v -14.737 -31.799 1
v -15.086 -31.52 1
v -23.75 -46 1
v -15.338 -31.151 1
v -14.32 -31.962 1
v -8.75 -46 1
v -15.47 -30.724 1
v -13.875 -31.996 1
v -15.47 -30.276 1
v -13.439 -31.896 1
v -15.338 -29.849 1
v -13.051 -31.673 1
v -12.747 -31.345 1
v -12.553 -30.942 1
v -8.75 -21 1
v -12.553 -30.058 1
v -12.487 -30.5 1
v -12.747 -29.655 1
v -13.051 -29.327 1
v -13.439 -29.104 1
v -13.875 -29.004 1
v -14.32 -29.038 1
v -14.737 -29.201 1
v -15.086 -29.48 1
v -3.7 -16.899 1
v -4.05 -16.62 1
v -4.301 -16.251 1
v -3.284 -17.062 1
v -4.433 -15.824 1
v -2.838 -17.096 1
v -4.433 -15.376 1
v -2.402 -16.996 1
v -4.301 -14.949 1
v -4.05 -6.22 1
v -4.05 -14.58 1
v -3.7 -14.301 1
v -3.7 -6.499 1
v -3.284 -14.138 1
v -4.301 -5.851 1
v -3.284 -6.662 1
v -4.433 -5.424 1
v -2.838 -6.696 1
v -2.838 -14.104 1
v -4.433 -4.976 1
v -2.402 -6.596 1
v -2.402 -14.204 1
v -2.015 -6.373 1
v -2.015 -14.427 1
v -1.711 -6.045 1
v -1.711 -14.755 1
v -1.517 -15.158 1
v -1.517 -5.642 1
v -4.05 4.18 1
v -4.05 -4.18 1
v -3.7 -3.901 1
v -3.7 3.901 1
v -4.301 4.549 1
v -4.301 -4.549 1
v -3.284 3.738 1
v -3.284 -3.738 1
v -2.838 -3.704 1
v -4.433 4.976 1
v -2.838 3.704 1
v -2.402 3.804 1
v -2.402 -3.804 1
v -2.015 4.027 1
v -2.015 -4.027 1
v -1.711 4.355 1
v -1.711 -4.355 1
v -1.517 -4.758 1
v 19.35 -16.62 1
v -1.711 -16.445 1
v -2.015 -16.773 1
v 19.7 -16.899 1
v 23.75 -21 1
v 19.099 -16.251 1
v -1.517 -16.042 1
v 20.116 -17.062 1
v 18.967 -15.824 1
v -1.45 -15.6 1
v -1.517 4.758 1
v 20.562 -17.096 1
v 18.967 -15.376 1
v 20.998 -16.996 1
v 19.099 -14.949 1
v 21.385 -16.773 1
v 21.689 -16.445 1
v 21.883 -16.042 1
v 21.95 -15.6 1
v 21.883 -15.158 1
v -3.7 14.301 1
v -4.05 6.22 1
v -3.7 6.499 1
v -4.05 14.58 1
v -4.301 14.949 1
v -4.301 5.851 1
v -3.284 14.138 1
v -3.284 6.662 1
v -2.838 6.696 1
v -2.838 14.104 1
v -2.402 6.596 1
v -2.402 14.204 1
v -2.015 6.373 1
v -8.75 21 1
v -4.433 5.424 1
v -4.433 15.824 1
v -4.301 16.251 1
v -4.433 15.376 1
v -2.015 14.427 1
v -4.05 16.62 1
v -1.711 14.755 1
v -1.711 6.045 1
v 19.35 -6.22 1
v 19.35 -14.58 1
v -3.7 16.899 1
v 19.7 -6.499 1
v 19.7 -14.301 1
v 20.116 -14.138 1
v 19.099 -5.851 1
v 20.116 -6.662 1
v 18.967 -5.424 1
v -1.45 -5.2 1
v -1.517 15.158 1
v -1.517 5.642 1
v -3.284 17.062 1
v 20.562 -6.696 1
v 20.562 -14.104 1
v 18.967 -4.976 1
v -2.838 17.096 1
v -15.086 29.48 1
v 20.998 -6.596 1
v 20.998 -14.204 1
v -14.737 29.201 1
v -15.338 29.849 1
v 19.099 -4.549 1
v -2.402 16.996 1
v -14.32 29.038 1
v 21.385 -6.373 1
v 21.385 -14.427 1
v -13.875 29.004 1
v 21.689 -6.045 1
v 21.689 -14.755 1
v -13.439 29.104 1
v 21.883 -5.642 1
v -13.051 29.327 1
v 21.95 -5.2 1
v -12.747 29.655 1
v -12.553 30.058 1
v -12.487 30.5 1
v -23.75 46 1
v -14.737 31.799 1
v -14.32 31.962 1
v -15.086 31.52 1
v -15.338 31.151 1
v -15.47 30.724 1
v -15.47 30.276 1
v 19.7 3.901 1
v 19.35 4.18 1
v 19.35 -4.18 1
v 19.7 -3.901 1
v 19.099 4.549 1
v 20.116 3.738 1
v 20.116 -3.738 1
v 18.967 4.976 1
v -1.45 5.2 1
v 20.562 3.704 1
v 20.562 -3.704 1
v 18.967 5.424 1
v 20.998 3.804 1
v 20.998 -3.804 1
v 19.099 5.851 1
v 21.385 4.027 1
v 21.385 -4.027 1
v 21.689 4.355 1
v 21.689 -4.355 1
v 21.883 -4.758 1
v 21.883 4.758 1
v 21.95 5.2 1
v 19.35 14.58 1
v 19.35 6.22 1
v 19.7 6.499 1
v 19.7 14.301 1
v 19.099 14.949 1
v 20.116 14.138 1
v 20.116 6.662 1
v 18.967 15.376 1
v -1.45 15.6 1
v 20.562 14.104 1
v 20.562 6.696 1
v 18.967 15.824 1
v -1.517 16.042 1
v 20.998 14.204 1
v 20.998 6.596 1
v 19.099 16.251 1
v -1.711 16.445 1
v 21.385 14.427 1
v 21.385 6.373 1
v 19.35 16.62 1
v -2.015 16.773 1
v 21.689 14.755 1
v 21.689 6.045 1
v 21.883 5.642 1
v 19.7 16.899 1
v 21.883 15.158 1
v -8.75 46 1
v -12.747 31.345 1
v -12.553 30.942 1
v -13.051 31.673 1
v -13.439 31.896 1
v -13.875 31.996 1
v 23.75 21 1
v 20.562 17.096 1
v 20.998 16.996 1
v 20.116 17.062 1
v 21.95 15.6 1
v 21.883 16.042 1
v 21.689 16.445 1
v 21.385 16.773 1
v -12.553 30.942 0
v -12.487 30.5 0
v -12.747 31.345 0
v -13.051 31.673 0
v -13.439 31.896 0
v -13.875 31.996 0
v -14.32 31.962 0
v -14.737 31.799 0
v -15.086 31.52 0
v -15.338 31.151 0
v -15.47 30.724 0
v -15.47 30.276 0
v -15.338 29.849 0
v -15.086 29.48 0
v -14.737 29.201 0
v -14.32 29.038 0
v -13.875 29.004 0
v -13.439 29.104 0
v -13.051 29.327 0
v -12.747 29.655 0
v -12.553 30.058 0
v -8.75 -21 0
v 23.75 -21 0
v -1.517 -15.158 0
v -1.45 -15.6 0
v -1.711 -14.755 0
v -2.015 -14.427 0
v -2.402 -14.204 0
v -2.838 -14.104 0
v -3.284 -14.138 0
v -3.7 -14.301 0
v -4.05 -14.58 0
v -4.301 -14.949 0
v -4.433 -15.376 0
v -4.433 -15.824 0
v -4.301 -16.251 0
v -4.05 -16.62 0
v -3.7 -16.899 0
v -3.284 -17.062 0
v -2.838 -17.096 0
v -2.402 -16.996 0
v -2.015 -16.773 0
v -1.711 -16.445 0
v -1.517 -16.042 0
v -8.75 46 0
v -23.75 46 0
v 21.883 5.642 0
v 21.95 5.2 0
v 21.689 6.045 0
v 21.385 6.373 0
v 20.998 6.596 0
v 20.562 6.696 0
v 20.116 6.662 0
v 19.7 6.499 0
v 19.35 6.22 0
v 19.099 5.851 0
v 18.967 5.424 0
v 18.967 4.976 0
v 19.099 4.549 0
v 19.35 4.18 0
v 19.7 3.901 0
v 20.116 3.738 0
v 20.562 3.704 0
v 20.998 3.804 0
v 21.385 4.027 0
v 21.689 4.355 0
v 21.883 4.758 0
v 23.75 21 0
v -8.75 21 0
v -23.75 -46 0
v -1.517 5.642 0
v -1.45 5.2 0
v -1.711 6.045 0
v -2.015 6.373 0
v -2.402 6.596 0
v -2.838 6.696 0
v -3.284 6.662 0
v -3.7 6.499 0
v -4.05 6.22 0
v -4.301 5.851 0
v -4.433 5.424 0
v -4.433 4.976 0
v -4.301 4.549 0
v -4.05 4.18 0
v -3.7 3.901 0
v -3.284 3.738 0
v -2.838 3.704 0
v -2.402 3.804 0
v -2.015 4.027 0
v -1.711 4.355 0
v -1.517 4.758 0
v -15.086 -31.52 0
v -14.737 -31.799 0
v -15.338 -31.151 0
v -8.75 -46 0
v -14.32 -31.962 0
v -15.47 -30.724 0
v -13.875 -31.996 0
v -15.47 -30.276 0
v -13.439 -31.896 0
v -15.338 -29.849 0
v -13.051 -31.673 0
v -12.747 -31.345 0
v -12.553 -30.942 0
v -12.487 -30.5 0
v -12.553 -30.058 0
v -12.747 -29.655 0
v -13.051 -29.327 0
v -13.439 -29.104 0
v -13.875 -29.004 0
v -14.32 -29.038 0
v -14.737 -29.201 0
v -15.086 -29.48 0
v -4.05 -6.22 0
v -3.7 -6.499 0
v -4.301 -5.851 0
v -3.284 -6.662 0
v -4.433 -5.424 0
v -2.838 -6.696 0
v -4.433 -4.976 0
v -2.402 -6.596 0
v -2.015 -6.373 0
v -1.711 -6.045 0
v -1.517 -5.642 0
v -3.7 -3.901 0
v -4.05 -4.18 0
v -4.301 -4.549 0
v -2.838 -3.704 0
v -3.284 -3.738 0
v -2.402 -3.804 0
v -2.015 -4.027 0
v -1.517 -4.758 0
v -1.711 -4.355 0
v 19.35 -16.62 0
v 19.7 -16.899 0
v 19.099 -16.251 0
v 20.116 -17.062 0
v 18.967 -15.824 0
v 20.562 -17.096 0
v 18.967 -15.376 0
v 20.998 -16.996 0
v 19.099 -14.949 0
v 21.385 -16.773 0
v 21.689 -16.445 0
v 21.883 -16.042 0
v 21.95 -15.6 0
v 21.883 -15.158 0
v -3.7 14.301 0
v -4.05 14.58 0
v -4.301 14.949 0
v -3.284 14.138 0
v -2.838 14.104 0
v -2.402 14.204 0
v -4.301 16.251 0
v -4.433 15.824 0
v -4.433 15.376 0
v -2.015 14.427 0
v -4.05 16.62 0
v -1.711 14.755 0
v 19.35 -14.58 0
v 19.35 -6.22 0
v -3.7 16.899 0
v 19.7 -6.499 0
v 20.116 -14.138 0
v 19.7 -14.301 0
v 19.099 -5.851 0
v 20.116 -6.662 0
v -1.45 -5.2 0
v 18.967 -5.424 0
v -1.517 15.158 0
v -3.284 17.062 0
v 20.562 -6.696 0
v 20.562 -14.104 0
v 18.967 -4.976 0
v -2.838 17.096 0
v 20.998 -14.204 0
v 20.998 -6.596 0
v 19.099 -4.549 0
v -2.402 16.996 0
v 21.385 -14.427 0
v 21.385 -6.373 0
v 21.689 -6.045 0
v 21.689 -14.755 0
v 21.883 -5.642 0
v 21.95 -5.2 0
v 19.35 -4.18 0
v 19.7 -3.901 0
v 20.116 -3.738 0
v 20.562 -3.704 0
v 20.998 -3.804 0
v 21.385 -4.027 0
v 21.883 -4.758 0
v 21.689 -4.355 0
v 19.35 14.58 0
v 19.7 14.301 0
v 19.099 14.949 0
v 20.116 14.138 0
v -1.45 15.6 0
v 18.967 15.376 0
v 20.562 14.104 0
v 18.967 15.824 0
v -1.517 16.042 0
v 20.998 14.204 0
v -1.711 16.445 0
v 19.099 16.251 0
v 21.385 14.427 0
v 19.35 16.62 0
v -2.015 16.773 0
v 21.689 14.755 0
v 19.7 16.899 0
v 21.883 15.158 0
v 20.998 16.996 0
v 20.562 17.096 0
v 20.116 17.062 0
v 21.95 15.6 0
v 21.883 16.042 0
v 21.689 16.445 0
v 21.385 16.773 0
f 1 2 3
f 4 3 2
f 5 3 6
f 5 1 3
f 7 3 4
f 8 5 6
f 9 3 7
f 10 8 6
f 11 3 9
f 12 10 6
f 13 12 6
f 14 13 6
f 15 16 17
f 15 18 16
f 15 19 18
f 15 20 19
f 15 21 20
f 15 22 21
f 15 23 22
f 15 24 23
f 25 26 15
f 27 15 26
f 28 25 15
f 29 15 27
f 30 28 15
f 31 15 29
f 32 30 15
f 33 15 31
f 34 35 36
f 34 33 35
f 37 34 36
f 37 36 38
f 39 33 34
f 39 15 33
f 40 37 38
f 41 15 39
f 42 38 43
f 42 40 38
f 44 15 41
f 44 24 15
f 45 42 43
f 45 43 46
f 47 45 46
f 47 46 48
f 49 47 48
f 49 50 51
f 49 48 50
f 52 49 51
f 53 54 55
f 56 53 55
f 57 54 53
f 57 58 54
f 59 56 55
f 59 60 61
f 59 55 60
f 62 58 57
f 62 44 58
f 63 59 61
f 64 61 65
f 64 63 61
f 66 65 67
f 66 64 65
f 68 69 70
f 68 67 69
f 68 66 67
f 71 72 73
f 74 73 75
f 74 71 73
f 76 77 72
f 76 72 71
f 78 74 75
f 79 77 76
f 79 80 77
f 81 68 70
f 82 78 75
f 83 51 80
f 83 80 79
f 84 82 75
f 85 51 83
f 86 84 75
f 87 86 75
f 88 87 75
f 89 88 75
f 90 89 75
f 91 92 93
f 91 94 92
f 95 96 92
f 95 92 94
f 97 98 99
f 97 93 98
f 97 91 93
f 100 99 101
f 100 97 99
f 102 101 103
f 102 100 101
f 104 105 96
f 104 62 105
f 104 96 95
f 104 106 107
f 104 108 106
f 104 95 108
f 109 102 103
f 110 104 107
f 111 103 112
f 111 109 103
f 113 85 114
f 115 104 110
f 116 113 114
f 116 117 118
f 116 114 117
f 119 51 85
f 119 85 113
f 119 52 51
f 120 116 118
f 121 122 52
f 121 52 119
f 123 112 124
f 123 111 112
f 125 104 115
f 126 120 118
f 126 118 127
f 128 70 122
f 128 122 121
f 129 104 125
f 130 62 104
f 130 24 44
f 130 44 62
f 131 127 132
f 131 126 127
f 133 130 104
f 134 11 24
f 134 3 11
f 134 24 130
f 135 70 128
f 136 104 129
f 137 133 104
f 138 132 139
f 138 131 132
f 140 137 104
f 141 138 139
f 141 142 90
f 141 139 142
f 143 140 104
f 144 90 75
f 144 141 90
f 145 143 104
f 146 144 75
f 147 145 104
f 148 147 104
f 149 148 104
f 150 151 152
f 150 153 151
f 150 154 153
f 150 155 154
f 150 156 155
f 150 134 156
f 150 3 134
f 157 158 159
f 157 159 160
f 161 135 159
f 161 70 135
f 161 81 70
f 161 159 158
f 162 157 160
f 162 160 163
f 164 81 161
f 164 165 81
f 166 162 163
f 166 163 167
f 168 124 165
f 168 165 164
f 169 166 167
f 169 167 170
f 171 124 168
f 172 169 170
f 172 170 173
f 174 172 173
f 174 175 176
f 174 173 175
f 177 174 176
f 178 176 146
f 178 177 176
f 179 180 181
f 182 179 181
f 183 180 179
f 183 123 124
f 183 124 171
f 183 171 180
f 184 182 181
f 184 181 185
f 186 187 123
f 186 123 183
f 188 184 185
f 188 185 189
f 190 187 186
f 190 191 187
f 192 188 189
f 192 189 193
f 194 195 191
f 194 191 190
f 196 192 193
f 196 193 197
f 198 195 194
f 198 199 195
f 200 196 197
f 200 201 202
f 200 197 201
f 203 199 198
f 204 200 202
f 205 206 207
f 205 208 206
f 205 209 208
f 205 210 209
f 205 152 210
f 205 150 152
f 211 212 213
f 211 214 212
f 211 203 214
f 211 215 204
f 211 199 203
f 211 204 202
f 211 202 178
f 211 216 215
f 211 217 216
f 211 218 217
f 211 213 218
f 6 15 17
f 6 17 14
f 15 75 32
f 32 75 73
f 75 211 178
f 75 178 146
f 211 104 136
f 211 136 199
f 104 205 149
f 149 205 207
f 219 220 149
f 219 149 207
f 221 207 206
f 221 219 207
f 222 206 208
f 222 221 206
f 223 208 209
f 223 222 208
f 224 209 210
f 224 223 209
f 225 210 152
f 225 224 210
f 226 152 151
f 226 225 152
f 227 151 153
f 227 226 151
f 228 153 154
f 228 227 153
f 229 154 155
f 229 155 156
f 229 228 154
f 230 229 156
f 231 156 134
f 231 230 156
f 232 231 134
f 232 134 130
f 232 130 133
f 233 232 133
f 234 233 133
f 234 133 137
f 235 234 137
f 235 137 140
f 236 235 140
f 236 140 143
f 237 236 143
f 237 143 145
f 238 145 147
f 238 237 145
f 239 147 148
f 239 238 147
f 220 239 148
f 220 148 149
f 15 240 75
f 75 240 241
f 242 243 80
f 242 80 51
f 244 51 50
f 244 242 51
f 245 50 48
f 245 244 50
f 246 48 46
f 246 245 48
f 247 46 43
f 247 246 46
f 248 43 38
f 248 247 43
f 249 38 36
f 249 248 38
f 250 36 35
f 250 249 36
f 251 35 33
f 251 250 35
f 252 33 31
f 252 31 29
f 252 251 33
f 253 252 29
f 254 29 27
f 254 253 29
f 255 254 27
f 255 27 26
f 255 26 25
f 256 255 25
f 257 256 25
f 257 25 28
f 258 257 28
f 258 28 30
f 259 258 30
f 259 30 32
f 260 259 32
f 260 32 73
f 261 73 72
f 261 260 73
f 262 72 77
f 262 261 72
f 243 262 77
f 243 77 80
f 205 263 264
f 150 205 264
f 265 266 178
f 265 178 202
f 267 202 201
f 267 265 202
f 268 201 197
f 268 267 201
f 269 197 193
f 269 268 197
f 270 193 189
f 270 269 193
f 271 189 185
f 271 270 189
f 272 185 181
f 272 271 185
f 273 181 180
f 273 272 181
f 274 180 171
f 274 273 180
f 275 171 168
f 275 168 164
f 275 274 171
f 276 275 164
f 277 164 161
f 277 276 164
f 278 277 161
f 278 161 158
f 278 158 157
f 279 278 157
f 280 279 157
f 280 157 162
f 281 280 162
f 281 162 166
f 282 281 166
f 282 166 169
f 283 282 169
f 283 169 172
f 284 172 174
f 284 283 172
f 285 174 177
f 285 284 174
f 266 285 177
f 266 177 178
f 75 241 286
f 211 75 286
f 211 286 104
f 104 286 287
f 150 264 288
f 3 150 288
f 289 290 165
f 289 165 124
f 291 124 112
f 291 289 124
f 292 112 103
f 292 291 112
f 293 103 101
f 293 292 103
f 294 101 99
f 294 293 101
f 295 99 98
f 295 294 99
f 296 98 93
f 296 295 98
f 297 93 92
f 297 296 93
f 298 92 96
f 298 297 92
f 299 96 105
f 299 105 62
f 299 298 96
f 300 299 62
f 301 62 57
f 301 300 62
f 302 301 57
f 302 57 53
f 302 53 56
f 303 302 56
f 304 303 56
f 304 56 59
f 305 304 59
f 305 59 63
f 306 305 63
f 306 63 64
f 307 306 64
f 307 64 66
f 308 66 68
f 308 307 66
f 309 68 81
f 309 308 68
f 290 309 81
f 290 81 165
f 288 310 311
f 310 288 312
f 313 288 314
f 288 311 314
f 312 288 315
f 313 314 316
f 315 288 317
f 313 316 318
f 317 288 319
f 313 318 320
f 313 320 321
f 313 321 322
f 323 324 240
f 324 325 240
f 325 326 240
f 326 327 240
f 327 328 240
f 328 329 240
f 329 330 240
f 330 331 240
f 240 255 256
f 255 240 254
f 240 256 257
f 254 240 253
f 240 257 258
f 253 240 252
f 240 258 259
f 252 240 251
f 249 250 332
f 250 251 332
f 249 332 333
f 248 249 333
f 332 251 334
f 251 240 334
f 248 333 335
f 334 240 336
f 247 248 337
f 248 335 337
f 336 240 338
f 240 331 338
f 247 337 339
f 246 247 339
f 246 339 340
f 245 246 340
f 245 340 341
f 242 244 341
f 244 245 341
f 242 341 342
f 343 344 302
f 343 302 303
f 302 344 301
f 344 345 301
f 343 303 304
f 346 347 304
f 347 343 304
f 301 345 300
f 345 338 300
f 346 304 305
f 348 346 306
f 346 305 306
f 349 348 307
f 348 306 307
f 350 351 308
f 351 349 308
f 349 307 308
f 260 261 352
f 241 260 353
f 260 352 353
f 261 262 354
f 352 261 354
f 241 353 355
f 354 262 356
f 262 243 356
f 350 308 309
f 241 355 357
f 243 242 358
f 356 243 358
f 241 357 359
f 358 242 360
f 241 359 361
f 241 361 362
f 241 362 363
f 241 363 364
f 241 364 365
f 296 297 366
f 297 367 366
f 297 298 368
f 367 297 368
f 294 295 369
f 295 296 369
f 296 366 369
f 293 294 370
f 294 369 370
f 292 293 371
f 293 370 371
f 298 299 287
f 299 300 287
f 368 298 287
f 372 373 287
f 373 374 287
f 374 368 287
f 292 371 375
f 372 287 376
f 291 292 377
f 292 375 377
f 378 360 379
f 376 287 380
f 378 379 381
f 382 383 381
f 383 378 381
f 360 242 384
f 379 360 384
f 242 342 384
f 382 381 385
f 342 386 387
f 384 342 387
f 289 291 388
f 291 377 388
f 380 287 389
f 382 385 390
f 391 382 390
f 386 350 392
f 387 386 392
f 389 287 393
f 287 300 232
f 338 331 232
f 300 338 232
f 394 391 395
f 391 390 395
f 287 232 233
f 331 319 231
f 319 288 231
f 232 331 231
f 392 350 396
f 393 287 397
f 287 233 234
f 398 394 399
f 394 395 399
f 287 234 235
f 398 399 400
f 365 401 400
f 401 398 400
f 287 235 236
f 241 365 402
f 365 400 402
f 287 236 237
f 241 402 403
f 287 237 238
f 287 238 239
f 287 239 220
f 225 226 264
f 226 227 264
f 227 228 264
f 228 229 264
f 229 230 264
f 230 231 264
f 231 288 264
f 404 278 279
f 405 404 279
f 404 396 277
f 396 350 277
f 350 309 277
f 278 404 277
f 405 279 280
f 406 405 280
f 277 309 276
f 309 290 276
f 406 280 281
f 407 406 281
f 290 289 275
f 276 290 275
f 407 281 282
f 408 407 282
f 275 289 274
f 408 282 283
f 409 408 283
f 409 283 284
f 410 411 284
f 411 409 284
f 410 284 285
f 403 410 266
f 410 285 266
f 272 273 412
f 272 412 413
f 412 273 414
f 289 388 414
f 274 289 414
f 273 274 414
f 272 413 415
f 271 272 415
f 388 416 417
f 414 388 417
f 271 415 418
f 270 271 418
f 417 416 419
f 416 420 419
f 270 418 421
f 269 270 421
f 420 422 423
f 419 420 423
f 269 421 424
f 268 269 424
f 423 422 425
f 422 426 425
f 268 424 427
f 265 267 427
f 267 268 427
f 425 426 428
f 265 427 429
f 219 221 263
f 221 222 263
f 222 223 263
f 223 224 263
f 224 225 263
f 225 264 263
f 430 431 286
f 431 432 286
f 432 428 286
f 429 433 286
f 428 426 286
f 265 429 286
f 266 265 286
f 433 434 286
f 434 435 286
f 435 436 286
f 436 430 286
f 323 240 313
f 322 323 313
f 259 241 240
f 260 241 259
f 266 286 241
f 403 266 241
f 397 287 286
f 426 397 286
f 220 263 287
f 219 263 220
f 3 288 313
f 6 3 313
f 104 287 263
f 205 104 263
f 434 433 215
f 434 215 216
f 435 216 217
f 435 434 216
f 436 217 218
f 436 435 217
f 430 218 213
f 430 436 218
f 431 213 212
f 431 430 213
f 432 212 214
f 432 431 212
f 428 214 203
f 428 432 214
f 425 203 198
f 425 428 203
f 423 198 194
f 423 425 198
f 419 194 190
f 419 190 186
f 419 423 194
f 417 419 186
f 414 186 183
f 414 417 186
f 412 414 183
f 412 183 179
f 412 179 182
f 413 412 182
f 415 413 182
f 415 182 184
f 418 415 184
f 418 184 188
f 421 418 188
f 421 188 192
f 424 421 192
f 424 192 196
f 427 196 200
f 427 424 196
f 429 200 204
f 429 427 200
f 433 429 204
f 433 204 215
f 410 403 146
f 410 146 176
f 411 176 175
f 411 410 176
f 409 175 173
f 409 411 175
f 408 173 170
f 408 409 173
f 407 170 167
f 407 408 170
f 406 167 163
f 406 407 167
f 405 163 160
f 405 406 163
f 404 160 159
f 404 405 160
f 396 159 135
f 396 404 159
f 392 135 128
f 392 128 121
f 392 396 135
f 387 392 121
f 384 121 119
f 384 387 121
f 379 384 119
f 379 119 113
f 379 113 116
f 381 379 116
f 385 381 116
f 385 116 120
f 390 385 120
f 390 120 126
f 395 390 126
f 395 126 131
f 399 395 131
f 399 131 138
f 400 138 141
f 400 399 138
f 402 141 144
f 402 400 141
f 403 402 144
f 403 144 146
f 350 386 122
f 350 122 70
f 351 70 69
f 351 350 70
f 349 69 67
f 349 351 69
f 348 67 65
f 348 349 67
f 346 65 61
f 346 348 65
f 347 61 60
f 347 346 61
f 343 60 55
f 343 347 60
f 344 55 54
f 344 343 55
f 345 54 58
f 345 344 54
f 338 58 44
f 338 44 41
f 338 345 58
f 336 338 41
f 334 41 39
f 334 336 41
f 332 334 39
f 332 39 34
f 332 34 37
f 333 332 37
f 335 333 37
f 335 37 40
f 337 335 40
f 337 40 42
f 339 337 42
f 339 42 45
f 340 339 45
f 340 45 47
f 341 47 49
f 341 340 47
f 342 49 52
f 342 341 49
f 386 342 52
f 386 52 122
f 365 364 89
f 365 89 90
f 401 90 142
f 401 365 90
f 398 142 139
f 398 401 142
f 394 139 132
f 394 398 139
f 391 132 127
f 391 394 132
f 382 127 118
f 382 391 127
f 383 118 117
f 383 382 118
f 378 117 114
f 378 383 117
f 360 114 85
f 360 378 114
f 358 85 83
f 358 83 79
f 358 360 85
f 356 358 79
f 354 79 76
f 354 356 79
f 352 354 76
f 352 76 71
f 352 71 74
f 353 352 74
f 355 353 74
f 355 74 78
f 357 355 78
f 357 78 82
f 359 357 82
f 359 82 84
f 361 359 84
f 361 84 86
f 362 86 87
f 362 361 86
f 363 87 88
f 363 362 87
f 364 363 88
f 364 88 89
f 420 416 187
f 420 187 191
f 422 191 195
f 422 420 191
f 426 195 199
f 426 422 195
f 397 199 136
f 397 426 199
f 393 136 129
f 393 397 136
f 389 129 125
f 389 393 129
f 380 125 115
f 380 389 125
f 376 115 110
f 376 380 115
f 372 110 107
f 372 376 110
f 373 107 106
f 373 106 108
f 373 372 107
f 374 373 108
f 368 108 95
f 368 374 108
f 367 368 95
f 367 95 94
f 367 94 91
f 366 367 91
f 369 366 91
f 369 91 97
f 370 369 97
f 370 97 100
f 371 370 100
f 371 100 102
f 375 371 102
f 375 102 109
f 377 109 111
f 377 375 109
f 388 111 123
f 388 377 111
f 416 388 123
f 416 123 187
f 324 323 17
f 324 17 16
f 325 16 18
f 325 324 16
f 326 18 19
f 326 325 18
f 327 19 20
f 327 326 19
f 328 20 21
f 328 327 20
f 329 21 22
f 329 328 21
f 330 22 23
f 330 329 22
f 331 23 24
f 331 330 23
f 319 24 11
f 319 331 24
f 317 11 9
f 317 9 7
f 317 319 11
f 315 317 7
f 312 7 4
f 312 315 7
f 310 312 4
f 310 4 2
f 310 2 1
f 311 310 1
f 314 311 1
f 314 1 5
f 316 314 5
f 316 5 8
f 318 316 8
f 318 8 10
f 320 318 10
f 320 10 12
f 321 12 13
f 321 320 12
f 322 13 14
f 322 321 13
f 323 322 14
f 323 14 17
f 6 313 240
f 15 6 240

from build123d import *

# Parameters (mm, degrees)
SKETCH_1_R      = 1.5
EXTRUDE_1_DEPTH = 1


with BuildPart() as part:
    # Эскиз1 → Бобышка-Вытянуть1 (new body)
    with BuildSketch(Plane.XY):
        Polygon((-23.75, 46), (-23.75, -46), (-8.75, -46), (-8.75, -21), (23.75, -21), (23.75, 21), (-8.75, 21), (-8.75, 46), align=None)
        with Locations((-13.986702311, 30.5)):
            Circle(SKETCH_1_R, mode=Mode.SUBTRACT)
        with Locations((-13.986702311, -30.5)):
            Circle(SKETCH_1_R, mode=Mode.SUBTRACT)
        with Locations((-2.95, -15.6)):
            Circle(SKETCH_1_R, mode=Mode.SUBTRACT)
        with Locations((-2.95, -5.2)):
            Circle(SKETCH_1_R, mode=Mode.SUBTRACT)
        with Locations((-2.95, 5.2)):
            Circle(SKETCH_1_R, mode=Mode.SUBTRACT)
        with Locations((-2.95, 15.6)):
            Circle(SKETCH_1_R, mode=Mode.SUBTRACT)
        with Locations((20.45, 15.6)):
            Circle(SKETCH_1_R, mode=Mode.SUBTRACT)
        with Locations((20.45, 5.2)):
            Circle(SKETCH_1_R, mode=Mode.SUBTRACT)
        with Locations((20.45, -5.2)):
            Circle(SKETCH_1_R, mode=Mode.SUBTRACT)
        with Locations((20.45, -15.6)):
            Circle(SKETCH_1_R, mode=Mode.SUBTRACT)
    extrude(amount=EXTRUDE_1_DEPTH)


solid = part.part
